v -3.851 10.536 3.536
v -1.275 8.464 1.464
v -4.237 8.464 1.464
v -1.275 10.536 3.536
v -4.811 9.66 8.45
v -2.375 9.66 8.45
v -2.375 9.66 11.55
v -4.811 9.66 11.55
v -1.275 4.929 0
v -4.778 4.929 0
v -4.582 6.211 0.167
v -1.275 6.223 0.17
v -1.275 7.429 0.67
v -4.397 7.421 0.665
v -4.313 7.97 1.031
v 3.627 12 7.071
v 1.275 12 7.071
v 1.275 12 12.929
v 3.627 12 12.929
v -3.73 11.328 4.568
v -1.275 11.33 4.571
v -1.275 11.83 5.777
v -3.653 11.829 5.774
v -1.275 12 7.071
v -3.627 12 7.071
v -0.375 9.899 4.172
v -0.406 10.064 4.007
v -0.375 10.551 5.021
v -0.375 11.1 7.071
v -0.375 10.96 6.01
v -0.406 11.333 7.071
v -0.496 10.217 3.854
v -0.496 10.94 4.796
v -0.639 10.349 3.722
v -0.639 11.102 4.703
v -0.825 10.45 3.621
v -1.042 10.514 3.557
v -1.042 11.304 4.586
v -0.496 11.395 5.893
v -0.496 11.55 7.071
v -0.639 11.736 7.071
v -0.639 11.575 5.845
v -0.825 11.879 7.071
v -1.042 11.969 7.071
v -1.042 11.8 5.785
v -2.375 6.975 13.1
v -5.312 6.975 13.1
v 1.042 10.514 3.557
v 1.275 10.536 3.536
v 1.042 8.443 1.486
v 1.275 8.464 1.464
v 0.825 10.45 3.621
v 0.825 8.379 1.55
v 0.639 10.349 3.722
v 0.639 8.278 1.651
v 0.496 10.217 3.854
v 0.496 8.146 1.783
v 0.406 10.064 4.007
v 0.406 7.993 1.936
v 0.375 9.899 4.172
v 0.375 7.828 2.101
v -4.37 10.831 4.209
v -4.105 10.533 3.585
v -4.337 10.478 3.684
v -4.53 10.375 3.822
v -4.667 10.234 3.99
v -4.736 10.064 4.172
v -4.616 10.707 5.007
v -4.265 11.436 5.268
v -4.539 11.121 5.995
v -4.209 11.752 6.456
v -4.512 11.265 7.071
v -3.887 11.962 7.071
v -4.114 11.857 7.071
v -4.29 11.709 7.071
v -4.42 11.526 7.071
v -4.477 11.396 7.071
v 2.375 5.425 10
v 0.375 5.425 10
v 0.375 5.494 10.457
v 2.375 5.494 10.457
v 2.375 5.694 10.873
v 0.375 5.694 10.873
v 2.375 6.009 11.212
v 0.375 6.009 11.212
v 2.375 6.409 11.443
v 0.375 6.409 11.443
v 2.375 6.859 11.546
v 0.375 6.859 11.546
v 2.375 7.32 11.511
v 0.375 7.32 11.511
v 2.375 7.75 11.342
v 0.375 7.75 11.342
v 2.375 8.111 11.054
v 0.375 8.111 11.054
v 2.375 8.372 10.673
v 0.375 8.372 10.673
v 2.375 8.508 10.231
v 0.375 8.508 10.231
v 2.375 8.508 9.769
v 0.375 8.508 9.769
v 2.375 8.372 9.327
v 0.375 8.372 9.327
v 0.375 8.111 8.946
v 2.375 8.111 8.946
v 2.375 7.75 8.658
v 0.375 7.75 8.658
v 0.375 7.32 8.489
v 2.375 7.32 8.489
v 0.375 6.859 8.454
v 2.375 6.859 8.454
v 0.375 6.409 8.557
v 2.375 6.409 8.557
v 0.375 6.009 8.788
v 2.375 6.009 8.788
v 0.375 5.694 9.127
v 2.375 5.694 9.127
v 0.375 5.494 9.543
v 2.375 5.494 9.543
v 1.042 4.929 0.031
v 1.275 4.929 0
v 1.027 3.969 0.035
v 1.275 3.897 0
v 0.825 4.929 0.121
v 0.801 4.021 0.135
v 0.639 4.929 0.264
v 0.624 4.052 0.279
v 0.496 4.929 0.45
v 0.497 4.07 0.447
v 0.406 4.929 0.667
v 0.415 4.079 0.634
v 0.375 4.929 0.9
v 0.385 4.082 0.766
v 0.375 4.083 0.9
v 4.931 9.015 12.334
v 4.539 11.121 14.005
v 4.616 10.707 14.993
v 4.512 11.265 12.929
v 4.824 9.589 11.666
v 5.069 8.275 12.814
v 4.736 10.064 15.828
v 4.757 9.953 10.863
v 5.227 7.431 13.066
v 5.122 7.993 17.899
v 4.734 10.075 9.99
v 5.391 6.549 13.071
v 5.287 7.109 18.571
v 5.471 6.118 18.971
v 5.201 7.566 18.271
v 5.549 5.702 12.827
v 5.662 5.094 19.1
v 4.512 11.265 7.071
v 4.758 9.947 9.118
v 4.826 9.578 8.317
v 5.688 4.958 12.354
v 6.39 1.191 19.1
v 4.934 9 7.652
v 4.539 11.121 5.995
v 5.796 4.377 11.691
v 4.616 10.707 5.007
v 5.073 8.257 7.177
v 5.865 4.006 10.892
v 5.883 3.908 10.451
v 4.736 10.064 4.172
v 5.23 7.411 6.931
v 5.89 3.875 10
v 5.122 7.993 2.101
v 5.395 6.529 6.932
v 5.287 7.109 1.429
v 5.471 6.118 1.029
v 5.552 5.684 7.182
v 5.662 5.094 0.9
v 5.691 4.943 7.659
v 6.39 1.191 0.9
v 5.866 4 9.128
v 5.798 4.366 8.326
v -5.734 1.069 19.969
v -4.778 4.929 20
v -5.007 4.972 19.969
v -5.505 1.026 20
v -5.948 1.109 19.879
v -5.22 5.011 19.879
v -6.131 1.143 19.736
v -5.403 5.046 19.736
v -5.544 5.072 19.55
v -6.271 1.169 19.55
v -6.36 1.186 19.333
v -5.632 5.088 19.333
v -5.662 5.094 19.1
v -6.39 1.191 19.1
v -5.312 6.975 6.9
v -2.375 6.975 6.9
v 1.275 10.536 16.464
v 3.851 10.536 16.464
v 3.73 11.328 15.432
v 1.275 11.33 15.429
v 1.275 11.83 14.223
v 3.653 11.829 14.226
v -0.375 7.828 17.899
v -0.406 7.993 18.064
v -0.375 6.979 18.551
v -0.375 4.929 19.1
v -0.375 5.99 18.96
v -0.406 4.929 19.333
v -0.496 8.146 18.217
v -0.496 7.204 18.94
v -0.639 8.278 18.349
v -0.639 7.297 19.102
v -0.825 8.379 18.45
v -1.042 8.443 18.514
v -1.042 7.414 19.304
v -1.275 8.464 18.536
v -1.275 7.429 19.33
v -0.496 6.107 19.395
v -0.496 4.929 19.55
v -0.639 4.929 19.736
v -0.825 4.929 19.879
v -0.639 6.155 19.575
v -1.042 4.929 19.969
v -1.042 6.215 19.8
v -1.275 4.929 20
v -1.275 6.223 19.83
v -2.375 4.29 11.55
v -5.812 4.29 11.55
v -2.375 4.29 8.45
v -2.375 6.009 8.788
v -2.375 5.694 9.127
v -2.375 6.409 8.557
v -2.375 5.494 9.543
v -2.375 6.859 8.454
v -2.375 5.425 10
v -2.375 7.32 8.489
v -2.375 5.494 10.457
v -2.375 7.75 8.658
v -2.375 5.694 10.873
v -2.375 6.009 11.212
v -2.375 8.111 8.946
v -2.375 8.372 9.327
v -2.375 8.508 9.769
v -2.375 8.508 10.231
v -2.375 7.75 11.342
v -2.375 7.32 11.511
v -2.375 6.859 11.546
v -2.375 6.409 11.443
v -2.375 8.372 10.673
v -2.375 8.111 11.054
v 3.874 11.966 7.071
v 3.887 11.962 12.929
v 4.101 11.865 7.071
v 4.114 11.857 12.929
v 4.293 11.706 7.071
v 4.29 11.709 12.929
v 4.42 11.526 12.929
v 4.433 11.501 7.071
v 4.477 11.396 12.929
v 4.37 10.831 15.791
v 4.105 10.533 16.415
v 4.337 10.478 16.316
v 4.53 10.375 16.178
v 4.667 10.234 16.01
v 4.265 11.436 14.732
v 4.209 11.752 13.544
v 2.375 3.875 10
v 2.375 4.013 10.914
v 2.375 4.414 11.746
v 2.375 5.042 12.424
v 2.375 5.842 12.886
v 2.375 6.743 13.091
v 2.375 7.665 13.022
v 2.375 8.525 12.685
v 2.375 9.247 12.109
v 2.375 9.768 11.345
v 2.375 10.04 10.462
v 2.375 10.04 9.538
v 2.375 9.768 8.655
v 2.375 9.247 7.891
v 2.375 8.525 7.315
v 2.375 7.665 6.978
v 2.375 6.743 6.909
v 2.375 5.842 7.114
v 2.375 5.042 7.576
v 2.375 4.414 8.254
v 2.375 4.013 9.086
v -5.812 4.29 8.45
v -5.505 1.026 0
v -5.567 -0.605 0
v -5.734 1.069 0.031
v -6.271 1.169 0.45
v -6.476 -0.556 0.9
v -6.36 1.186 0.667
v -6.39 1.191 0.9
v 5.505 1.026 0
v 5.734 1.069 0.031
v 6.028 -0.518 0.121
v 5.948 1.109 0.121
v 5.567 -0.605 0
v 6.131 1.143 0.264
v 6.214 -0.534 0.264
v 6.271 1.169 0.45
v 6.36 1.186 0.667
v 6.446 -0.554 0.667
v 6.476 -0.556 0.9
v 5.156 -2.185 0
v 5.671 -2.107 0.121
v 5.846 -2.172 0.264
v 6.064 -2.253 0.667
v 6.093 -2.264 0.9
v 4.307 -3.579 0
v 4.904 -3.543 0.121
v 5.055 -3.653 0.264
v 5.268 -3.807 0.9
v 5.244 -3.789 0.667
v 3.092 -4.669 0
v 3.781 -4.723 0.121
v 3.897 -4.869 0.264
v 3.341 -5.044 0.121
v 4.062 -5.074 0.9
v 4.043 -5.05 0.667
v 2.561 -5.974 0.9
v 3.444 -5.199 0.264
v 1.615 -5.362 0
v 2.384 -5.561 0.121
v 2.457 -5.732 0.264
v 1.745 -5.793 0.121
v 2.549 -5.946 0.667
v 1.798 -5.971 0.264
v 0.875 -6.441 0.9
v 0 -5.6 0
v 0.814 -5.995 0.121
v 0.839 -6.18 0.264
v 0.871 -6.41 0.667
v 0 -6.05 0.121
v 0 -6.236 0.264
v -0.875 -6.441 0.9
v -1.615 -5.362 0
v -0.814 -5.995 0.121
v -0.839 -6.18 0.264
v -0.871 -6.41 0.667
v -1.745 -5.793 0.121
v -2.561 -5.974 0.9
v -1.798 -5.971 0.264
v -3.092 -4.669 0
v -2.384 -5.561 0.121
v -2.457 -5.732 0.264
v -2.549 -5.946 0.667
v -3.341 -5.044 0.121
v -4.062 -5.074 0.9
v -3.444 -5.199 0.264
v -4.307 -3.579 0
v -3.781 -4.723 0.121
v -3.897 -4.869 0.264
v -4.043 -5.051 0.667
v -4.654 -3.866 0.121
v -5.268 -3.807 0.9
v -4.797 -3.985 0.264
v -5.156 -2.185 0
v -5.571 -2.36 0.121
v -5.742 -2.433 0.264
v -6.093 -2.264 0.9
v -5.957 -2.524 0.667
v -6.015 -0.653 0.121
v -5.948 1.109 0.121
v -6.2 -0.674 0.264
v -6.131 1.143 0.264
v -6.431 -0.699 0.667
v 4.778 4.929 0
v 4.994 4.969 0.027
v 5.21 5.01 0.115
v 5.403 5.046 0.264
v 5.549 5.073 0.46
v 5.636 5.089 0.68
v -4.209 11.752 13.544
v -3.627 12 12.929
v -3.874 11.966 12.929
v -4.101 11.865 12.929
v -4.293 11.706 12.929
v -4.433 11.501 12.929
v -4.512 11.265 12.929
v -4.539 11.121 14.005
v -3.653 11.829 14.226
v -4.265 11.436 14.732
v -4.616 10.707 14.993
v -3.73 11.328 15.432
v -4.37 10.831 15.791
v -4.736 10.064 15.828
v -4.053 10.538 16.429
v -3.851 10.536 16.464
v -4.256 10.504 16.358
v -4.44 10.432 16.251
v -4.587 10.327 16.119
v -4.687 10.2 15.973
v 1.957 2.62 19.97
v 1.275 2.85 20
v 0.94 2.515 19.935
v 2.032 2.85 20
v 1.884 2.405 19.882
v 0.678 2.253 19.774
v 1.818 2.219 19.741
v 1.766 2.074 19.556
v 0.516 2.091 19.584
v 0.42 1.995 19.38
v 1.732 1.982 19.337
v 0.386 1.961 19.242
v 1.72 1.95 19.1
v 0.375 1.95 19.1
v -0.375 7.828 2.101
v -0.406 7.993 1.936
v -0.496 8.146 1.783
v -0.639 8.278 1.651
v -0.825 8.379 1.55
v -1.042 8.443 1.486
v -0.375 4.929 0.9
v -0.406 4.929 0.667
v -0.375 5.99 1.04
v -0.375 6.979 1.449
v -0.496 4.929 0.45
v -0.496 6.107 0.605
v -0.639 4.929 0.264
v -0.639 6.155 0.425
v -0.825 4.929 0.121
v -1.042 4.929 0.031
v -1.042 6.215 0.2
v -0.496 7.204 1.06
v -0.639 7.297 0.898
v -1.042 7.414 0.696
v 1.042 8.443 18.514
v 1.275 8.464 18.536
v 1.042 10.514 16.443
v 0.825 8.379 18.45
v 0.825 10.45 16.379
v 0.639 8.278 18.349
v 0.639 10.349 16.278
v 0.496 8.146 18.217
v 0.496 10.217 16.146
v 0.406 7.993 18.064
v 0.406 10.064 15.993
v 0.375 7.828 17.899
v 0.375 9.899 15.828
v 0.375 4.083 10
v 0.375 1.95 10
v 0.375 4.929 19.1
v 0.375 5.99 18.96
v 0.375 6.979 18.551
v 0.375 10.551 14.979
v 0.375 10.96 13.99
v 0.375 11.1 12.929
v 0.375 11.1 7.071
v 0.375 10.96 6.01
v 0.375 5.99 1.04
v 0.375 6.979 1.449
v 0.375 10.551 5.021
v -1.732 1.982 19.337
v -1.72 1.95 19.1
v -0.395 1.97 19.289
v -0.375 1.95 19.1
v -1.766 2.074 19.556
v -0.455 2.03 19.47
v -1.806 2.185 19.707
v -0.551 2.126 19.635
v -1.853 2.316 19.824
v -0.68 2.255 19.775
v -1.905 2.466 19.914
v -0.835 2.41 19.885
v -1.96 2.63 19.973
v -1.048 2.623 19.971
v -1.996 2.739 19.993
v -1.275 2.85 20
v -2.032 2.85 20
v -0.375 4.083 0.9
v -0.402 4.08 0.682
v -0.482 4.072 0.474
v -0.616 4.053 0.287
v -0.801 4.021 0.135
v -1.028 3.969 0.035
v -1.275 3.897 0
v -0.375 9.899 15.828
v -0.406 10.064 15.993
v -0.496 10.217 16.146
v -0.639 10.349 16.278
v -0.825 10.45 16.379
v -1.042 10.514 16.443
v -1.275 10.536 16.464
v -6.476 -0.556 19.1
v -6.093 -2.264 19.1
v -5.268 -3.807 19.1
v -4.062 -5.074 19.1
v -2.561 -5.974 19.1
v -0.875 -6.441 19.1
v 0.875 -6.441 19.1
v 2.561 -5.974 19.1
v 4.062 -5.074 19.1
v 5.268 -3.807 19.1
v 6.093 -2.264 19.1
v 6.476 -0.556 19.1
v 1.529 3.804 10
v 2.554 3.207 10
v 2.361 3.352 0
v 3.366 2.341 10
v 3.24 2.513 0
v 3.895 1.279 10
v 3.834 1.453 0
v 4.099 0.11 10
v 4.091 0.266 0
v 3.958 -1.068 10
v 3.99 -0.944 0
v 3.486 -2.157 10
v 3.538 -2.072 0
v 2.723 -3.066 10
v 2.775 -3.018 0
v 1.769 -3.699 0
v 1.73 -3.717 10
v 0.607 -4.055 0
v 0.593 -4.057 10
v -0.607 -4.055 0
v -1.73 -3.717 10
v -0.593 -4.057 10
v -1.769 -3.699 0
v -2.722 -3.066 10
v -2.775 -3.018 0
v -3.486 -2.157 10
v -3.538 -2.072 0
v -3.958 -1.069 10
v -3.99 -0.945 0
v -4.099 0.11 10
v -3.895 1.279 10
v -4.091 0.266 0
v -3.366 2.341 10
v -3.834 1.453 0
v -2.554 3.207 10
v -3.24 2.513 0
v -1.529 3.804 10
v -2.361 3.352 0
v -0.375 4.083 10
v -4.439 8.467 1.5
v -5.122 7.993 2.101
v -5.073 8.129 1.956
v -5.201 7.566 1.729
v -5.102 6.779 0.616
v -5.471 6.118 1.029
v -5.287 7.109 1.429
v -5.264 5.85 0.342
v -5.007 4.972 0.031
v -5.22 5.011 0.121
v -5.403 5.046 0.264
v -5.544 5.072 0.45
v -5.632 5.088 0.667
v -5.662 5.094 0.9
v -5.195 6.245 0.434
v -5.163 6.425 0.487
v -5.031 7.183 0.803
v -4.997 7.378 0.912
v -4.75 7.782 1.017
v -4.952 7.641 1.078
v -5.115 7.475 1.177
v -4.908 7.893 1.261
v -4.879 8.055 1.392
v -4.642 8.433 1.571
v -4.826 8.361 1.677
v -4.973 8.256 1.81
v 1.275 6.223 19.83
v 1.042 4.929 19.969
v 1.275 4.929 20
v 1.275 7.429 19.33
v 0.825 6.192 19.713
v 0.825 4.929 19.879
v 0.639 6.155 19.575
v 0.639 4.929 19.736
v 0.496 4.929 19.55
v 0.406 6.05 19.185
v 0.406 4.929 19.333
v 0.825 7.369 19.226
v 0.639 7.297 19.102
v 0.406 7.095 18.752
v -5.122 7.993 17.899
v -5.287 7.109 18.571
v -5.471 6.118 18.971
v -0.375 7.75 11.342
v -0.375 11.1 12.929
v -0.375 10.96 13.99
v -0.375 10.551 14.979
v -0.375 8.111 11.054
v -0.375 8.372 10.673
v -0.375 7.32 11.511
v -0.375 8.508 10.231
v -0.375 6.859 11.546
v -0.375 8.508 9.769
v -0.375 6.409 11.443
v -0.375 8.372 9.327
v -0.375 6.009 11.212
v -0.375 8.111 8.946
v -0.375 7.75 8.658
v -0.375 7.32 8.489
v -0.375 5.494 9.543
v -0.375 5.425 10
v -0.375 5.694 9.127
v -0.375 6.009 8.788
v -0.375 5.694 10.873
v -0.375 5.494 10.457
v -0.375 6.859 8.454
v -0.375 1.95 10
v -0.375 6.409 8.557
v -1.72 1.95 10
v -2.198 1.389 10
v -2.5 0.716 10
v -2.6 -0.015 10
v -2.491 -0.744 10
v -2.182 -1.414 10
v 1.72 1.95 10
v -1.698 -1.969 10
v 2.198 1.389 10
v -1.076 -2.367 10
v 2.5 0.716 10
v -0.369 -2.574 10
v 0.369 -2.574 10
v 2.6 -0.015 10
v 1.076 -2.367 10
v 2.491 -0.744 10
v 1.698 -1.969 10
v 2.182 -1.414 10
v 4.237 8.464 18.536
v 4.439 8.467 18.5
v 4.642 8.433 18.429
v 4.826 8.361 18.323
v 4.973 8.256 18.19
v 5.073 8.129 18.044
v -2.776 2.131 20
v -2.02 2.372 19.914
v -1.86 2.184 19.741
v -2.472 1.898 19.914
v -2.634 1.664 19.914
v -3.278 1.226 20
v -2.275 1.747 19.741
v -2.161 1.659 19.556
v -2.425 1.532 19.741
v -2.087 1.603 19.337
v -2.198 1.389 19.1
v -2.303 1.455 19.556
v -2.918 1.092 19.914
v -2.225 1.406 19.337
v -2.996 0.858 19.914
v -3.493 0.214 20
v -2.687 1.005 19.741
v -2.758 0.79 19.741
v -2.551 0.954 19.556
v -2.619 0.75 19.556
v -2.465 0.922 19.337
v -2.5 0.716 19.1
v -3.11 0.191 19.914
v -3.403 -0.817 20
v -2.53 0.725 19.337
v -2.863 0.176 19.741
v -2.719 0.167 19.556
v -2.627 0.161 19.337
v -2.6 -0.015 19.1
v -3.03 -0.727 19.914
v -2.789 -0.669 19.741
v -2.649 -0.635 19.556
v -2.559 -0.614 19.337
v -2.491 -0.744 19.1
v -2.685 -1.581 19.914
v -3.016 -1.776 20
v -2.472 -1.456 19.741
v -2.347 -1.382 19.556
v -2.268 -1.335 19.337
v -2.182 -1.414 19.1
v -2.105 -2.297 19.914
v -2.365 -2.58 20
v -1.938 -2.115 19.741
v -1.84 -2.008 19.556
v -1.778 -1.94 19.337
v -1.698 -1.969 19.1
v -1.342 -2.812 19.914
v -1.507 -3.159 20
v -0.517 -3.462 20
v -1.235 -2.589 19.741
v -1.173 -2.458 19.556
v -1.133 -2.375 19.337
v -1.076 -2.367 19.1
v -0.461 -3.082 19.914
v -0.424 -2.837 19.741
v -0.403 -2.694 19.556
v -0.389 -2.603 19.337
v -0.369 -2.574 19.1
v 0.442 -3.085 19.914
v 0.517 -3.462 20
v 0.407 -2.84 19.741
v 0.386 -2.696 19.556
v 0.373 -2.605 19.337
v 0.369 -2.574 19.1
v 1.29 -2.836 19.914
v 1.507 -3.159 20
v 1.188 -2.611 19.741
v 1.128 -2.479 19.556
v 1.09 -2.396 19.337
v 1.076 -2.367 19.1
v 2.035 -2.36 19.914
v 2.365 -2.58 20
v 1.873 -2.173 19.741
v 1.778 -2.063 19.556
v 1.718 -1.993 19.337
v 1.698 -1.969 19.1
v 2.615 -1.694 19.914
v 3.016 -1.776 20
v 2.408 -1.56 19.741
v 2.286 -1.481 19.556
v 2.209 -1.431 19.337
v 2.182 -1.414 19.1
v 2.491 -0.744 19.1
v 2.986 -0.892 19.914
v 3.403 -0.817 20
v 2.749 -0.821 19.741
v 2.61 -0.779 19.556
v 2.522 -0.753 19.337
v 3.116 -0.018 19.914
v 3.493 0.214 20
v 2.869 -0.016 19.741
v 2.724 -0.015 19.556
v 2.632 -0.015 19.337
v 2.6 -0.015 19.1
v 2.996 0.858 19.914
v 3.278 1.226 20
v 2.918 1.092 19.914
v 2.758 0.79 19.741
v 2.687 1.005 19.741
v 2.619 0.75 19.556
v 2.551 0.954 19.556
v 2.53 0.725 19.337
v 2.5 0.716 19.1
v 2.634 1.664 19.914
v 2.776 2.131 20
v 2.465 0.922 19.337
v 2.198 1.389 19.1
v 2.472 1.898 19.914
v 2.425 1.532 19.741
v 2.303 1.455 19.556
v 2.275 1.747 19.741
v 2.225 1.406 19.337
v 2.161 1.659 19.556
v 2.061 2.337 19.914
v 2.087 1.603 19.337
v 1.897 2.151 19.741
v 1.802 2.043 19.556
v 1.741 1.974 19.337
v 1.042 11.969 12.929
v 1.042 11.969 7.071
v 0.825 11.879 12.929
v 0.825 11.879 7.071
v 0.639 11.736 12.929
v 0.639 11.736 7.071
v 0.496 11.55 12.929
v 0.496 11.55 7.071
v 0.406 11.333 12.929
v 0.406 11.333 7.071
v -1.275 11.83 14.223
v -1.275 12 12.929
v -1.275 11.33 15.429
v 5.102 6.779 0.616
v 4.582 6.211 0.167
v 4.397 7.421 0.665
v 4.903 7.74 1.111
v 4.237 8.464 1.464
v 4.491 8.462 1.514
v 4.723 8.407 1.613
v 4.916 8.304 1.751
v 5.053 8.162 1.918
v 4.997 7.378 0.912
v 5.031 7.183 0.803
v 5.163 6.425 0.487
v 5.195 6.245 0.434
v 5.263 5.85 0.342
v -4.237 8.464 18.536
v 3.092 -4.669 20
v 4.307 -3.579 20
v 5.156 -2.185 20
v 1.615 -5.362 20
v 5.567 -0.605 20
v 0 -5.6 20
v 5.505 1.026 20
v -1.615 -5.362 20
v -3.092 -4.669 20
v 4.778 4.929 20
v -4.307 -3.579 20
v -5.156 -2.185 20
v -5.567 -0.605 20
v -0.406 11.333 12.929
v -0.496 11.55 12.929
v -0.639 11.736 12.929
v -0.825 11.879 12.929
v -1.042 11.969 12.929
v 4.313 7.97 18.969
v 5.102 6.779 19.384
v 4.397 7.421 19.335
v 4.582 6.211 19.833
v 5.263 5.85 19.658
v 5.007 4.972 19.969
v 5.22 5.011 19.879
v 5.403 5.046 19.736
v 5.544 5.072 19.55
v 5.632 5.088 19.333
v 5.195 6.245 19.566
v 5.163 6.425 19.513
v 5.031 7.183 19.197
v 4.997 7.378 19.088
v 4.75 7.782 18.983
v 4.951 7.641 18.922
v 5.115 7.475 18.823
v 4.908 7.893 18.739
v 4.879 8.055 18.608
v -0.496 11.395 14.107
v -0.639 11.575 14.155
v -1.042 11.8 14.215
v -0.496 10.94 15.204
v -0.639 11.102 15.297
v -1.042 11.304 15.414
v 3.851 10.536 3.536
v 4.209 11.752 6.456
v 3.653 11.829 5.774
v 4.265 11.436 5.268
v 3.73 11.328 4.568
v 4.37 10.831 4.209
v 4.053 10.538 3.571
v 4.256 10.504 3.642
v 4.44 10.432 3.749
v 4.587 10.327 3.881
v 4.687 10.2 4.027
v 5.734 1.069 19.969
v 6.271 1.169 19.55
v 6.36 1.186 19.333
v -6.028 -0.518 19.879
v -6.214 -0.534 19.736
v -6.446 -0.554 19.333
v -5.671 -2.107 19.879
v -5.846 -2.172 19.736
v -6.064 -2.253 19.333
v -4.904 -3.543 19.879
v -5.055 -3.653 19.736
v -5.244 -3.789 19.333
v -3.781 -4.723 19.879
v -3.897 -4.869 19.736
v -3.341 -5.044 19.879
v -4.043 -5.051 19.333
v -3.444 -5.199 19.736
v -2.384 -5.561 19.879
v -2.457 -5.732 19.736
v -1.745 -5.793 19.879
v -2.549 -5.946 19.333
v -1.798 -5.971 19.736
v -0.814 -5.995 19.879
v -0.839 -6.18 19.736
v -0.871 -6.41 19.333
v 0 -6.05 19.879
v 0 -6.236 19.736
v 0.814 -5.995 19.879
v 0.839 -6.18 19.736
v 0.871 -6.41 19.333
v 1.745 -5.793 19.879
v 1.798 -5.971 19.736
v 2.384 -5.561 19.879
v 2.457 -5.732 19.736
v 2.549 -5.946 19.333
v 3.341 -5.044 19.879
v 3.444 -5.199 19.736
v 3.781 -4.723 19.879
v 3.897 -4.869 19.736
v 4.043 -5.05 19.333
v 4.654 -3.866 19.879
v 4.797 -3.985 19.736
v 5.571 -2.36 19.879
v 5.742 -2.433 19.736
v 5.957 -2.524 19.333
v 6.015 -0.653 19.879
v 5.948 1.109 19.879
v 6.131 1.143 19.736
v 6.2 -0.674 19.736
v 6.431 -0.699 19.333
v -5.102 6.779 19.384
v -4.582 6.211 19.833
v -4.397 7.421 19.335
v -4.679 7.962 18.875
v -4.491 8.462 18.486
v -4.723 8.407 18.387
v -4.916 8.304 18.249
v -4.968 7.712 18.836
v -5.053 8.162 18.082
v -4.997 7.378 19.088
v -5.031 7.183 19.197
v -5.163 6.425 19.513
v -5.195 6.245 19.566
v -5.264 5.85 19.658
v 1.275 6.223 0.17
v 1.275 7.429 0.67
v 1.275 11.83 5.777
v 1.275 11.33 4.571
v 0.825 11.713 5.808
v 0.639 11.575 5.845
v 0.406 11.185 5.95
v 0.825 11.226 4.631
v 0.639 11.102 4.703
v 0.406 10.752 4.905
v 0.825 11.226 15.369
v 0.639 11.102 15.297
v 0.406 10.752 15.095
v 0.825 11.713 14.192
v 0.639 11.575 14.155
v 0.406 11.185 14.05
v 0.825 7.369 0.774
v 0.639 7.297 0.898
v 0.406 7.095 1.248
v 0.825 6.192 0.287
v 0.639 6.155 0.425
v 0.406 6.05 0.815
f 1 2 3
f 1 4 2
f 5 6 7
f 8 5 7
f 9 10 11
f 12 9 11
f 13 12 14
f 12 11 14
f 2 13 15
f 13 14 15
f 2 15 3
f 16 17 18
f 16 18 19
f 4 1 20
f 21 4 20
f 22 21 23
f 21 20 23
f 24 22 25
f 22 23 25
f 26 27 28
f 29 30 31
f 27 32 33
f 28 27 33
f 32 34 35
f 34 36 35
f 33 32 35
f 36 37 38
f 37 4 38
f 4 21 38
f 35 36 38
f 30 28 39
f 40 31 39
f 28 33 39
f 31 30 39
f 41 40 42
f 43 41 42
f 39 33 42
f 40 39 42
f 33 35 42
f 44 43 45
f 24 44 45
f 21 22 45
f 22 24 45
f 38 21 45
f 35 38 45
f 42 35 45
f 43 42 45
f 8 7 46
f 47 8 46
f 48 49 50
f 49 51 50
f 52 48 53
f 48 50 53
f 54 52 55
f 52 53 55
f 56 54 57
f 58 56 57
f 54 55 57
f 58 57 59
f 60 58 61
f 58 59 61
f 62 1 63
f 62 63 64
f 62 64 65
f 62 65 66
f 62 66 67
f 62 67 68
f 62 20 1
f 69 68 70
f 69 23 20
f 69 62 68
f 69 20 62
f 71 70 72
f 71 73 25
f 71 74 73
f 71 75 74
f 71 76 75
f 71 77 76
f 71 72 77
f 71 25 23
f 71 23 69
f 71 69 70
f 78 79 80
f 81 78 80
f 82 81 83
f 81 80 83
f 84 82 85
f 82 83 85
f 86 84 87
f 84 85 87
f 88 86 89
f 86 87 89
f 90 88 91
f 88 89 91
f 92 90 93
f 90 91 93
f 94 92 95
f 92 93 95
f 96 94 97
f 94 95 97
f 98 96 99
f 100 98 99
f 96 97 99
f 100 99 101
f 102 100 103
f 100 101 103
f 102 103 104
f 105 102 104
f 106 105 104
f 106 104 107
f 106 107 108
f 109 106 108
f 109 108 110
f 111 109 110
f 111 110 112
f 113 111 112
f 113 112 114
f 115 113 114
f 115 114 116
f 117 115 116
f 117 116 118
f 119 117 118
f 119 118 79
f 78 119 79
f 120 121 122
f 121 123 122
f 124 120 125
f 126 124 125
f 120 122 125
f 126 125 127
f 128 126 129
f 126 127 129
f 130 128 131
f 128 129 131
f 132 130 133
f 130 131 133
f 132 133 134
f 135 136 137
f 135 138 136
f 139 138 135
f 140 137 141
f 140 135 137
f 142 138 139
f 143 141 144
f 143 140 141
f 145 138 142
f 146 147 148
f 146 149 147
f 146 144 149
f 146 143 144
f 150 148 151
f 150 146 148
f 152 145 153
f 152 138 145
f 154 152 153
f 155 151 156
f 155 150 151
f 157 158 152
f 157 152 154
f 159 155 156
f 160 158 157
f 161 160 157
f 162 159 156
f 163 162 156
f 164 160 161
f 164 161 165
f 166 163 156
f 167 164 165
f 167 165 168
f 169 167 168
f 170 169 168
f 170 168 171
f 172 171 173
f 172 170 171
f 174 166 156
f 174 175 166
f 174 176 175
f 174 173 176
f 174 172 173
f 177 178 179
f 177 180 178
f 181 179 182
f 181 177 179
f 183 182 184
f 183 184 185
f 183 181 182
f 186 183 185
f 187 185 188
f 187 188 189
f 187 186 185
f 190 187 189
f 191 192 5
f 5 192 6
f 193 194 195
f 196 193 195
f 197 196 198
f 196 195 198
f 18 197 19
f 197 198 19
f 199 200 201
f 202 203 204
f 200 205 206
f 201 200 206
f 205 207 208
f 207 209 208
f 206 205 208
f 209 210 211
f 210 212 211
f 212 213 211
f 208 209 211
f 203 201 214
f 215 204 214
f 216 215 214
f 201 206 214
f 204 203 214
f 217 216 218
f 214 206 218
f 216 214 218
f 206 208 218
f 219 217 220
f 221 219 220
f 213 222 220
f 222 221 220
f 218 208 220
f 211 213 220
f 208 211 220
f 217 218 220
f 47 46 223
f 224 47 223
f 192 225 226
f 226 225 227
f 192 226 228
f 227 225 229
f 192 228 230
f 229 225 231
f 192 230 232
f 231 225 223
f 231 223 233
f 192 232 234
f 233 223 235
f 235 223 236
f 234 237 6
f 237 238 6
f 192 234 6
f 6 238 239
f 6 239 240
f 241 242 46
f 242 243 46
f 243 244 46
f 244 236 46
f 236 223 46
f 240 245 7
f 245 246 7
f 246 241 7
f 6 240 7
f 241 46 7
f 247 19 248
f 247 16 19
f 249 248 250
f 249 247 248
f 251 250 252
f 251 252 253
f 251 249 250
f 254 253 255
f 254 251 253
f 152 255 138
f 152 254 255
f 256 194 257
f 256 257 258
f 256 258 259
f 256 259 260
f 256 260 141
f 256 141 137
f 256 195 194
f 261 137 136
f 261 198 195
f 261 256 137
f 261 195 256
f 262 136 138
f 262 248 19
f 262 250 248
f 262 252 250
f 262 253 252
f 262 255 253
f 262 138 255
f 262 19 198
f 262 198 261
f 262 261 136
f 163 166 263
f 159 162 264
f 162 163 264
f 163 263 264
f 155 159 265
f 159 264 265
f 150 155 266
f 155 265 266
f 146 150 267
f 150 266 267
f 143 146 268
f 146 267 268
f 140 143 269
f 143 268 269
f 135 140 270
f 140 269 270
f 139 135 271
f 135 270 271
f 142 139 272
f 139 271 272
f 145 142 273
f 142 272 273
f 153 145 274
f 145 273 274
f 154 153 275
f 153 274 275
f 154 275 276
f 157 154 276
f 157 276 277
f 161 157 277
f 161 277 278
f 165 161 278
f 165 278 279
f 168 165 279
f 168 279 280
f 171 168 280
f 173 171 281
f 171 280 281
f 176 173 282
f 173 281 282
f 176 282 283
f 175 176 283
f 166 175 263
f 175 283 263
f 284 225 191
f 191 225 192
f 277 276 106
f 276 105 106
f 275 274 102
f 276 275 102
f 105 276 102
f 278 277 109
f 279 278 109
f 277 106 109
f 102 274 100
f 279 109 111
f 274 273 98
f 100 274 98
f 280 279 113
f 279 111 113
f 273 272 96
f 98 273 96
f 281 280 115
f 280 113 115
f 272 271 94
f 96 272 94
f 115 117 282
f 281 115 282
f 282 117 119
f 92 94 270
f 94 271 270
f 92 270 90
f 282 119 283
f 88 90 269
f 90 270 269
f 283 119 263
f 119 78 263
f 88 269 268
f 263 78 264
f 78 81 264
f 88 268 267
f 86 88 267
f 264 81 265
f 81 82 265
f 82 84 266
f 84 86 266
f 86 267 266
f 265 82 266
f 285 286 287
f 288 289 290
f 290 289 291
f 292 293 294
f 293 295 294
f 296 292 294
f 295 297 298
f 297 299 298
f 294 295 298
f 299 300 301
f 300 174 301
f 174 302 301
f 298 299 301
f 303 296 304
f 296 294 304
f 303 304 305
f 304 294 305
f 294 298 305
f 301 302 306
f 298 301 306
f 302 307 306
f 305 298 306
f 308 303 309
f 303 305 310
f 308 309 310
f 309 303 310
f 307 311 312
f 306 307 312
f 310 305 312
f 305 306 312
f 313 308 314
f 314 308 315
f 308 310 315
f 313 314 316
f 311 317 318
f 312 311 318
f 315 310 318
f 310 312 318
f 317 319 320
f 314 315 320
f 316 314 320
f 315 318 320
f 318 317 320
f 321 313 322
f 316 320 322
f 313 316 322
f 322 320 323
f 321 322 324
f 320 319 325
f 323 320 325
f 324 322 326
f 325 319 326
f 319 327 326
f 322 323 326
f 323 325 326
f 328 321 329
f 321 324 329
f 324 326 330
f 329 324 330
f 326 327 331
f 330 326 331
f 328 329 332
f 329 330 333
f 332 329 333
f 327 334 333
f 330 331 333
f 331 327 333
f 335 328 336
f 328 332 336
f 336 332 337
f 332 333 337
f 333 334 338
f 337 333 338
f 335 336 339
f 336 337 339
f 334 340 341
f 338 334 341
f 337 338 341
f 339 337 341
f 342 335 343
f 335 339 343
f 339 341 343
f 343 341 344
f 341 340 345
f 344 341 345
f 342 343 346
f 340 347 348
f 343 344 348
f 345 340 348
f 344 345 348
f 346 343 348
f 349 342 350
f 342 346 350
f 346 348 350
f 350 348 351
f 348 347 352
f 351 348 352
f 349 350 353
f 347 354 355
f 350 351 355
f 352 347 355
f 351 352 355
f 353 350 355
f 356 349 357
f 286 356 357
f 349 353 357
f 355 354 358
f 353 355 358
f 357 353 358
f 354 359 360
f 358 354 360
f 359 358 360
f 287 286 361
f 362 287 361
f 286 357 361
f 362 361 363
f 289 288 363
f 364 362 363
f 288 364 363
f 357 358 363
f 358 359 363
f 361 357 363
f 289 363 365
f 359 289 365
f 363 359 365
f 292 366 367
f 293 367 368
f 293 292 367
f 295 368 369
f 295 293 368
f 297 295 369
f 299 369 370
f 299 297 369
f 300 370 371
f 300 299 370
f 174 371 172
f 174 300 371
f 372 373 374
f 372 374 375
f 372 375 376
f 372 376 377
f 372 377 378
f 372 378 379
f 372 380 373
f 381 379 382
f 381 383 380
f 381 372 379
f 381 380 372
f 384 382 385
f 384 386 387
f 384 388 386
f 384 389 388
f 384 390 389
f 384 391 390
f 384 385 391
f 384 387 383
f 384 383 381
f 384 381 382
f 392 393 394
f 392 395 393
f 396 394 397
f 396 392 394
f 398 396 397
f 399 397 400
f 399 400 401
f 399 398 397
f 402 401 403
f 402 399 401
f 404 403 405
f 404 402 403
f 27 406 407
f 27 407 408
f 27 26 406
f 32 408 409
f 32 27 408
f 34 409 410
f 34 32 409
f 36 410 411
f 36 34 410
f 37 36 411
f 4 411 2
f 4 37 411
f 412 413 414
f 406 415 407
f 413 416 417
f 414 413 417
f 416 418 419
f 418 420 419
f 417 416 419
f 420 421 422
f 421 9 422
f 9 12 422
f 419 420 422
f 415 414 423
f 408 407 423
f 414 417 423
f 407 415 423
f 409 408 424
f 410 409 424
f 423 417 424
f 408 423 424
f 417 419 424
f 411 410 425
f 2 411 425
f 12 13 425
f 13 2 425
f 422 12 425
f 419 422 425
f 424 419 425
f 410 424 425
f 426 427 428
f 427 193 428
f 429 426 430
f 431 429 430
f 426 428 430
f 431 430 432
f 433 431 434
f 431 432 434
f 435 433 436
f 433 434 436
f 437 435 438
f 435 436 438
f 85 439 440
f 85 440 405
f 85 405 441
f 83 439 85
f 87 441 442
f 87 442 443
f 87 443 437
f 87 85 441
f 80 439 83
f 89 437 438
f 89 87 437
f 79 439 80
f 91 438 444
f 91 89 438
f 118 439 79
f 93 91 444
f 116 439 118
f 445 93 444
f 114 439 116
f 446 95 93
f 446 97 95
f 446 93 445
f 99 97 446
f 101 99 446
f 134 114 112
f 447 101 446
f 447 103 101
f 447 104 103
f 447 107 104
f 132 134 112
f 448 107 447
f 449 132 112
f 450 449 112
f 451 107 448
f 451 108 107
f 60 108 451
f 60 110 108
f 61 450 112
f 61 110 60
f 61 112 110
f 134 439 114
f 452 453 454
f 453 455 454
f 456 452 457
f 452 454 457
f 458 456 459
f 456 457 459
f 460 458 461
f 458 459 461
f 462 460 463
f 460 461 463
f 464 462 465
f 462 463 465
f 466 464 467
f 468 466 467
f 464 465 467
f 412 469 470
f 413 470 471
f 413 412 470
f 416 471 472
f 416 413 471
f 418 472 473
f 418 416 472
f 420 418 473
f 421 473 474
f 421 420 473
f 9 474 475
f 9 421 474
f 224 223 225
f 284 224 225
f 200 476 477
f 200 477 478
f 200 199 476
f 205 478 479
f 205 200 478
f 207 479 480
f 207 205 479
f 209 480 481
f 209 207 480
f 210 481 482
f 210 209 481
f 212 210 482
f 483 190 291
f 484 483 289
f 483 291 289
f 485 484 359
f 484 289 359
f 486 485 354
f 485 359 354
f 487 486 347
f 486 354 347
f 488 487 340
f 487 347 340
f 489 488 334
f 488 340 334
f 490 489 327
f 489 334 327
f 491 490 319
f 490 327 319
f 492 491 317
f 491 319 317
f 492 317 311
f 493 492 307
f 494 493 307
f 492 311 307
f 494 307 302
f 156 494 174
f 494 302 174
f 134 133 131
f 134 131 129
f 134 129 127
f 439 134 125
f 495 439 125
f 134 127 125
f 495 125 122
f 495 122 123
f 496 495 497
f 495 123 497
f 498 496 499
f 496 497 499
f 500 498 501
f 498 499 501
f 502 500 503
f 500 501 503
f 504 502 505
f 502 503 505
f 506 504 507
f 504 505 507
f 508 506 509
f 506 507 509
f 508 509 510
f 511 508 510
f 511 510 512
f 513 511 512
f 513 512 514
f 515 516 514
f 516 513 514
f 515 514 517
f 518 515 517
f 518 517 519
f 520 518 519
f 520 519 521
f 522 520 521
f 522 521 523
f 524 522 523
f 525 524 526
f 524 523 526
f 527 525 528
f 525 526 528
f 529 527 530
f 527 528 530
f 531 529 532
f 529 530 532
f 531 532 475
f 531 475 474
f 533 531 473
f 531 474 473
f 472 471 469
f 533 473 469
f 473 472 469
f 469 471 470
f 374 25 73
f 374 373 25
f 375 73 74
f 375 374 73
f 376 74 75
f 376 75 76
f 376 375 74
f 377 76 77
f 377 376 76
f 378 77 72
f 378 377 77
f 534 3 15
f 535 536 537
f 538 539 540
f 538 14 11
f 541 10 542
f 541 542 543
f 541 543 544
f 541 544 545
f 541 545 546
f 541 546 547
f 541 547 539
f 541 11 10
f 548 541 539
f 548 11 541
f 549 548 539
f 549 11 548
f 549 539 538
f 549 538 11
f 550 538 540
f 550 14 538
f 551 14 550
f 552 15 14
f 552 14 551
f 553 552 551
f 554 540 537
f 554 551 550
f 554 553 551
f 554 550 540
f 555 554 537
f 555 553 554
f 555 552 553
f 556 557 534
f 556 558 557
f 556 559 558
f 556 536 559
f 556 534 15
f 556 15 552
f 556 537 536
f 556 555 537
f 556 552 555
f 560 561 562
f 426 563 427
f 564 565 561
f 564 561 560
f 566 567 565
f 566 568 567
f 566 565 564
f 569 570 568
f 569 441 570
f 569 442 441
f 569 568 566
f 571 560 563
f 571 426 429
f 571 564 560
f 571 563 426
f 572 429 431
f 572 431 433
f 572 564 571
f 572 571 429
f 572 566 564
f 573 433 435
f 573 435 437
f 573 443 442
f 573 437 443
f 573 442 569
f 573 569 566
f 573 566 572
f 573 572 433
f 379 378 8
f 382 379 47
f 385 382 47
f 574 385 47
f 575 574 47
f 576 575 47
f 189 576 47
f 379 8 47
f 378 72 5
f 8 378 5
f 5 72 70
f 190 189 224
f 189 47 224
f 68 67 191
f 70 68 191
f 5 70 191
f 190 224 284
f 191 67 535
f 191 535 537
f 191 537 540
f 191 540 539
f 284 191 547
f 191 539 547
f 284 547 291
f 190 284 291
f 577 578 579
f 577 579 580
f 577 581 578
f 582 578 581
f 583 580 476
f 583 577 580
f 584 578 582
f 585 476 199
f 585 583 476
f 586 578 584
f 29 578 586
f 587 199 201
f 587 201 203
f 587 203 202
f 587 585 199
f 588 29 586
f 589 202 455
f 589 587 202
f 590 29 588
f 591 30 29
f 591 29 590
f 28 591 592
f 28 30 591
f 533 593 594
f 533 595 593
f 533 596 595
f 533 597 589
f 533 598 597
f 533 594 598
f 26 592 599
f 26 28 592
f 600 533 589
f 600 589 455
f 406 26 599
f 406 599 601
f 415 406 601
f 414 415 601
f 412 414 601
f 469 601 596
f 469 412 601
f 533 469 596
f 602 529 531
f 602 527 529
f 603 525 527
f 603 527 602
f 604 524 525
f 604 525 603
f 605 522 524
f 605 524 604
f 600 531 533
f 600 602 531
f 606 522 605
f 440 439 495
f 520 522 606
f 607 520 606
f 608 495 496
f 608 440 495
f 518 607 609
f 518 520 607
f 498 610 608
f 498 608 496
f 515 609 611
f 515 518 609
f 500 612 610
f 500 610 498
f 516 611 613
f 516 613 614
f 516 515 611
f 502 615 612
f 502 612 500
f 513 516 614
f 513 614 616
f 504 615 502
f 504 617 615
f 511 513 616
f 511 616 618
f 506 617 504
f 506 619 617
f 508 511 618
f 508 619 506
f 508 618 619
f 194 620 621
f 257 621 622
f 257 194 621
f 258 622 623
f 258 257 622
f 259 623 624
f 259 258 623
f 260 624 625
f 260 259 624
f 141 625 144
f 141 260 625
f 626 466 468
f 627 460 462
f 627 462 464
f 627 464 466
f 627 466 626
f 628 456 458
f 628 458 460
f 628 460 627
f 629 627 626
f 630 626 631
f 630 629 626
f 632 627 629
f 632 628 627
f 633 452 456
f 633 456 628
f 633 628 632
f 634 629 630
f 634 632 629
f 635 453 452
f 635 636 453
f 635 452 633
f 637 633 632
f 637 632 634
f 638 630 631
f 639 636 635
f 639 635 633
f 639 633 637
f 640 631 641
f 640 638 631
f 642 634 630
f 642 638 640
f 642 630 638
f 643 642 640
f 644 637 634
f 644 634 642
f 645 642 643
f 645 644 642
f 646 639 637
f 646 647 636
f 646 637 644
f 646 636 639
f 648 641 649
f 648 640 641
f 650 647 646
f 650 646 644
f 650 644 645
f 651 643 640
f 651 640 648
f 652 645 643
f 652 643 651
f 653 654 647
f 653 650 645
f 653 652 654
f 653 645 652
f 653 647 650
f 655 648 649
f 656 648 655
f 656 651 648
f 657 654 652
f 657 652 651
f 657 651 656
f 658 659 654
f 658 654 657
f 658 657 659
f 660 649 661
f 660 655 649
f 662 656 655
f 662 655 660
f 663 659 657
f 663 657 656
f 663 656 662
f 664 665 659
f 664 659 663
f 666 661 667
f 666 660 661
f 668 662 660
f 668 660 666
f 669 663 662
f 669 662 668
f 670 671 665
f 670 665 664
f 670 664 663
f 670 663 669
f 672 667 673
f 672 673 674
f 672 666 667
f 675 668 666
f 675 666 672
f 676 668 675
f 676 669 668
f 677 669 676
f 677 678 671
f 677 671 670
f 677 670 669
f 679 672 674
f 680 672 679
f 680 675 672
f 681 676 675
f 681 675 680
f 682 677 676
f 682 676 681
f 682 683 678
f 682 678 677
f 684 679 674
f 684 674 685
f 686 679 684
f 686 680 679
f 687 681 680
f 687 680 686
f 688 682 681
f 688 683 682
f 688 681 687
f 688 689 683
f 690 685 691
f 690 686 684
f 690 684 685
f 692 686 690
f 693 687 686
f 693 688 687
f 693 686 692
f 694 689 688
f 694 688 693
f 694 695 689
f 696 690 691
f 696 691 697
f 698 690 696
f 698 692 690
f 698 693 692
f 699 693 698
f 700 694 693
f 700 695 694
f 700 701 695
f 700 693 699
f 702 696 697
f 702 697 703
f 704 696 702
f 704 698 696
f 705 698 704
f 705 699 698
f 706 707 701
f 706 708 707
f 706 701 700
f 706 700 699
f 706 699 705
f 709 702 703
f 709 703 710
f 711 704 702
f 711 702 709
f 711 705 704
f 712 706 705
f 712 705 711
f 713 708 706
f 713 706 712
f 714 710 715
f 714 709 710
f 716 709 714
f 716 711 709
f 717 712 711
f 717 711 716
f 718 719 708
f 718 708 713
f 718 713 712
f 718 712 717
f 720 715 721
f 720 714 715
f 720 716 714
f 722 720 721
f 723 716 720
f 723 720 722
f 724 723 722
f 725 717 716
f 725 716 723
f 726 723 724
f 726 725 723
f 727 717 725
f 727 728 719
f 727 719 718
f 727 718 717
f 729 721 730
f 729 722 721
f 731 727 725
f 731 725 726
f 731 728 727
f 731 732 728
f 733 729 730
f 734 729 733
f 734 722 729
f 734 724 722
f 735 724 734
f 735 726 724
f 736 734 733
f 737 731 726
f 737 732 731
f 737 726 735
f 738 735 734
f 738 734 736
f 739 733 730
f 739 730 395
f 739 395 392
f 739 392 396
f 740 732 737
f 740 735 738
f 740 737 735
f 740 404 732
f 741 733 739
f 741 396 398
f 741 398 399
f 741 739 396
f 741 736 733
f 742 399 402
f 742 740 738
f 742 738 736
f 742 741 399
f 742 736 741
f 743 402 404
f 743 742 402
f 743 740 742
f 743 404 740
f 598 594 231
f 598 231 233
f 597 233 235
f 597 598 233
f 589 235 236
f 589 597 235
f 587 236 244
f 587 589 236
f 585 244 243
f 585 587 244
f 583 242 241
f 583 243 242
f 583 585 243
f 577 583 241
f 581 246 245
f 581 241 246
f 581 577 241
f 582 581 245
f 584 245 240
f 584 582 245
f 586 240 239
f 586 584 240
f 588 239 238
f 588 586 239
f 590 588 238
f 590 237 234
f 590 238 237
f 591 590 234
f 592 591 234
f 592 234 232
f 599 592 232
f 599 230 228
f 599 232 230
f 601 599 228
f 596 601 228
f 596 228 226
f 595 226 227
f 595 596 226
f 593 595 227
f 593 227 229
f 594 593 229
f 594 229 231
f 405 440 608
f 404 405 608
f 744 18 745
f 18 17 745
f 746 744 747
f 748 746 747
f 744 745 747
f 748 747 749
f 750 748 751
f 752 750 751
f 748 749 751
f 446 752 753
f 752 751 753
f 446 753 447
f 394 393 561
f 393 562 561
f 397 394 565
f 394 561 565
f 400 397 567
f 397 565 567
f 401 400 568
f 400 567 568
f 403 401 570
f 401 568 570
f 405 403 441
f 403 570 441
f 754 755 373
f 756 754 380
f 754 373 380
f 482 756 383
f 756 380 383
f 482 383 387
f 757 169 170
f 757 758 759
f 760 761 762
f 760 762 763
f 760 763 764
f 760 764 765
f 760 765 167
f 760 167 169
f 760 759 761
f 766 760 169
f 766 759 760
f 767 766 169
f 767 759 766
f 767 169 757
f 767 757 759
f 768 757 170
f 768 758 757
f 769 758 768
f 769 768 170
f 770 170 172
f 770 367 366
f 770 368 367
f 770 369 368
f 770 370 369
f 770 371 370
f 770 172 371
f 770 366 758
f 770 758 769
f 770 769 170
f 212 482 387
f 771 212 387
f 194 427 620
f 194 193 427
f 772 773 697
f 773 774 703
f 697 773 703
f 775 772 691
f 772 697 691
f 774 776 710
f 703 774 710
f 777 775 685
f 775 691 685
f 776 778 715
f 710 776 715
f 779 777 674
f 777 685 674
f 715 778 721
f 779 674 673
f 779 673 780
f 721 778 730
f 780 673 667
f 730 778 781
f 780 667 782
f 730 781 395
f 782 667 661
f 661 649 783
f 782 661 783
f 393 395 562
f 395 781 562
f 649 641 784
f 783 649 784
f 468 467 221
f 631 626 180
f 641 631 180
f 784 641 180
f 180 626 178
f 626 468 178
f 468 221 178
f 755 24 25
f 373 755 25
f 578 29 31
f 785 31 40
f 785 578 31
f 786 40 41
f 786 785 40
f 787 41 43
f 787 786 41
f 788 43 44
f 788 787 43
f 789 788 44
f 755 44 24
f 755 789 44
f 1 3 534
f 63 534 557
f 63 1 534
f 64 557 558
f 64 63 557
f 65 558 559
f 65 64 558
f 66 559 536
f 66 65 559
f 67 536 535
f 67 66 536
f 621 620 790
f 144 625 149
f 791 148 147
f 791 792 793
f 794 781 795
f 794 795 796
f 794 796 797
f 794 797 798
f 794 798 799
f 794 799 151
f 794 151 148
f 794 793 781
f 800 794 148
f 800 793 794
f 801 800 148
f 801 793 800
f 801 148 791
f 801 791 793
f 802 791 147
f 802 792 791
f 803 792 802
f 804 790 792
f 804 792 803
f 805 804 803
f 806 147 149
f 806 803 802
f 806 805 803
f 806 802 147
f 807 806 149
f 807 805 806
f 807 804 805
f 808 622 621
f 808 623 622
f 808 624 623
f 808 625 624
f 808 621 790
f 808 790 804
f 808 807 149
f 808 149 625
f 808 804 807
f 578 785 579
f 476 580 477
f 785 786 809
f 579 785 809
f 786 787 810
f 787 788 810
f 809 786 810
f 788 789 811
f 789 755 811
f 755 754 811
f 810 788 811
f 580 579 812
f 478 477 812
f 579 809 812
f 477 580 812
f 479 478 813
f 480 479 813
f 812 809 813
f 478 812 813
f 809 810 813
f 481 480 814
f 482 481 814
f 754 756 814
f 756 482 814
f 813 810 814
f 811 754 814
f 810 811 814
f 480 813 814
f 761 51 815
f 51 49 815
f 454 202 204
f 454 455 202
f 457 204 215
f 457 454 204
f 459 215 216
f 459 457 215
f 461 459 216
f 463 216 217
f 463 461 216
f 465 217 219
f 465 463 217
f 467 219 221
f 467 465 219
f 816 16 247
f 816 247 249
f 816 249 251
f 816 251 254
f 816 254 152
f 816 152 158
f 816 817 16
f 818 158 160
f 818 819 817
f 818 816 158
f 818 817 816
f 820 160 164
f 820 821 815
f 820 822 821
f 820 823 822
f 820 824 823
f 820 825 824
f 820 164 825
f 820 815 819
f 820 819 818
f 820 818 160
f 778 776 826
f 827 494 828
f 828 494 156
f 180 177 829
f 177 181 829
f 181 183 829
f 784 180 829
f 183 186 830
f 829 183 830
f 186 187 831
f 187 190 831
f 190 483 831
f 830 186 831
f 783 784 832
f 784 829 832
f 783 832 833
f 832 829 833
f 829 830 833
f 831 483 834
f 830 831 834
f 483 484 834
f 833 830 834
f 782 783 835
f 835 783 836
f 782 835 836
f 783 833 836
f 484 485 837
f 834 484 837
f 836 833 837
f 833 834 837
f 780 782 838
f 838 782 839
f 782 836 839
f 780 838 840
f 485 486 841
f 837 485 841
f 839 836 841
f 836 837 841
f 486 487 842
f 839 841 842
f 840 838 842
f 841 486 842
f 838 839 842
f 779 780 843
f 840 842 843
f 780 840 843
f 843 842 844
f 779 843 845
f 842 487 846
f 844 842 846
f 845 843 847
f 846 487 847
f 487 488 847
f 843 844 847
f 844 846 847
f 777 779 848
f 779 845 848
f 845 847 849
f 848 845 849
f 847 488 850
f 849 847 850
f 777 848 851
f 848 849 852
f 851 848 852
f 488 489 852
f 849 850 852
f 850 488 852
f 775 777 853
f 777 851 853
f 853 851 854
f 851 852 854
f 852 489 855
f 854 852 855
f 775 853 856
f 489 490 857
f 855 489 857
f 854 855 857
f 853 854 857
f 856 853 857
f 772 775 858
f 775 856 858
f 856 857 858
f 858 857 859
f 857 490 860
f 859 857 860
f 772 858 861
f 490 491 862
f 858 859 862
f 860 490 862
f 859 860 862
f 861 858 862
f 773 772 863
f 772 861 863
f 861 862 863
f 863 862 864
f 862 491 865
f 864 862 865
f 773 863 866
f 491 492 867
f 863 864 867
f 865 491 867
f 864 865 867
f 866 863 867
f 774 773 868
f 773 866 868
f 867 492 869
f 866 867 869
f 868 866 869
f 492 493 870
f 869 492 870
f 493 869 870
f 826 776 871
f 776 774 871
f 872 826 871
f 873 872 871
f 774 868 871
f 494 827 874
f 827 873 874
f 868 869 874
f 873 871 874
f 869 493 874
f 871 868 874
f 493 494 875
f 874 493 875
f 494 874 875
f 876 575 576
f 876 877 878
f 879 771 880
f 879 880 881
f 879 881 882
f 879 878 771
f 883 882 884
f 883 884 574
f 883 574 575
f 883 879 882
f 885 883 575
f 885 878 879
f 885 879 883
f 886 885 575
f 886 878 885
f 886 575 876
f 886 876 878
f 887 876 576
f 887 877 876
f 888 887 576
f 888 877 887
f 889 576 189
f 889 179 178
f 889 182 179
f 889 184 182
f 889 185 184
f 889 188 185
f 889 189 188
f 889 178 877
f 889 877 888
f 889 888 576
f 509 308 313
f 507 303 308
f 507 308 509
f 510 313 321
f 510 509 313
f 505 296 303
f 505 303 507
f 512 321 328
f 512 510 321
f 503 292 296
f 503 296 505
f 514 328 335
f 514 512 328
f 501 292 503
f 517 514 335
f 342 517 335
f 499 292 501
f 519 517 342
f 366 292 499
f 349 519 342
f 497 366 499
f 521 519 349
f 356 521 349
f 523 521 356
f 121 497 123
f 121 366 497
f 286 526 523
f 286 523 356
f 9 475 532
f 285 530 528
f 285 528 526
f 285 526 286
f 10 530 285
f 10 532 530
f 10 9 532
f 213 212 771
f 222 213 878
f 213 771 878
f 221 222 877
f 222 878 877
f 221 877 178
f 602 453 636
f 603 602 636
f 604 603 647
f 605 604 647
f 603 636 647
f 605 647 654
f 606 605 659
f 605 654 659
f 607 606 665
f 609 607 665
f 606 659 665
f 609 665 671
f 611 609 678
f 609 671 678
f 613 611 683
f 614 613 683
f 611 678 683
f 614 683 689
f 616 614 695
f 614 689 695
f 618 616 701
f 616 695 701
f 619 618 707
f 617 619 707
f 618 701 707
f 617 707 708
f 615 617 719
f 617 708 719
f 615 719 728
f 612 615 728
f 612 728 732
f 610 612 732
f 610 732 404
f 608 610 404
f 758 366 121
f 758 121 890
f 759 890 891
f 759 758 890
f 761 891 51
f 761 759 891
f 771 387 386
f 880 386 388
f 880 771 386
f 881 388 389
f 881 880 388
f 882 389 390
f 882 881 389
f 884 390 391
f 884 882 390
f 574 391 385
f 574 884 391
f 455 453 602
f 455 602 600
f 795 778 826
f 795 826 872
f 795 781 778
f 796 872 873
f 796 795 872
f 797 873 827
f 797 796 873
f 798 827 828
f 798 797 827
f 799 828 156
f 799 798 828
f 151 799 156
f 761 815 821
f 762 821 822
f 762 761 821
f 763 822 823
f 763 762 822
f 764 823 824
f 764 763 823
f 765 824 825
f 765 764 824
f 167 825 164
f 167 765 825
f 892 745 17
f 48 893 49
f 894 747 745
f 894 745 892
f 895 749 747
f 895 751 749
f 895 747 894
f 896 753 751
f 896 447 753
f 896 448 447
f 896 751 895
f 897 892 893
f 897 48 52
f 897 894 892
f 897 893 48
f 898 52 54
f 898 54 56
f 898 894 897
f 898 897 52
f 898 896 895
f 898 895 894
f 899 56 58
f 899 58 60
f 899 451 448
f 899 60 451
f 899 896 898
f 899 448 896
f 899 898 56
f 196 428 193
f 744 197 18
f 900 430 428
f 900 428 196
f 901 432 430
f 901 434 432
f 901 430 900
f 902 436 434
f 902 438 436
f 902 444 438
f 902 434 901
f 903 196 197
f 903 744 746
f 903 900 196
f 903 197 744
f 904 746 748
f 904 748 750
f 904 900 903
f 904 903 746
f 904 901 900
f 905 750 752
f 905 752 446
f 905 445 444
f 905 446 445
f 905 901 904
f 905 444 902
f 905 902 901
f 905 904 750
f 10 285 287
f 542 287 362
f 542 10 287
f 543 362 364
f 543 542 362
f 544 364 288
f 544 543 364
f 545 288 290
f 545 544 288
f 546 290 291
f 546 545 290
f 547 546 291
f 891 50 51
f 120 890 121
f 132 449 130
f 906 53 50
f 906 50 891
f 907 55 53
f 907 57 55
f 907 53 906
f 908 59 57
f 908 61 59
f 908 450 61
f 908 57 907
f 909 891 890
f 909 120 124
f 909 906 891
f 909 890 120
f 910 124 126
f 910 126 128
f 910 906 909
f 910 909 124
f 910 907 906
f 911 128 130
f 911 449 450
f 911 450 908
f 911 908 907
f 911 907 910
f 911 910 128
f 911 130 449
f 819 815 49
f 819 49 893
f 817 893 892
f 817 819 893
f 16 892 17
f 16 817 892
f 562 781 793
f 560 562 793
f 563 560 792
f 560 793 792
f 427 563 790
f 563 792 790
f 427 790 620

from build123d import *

# Parameters (mm, degrees)
EXTRUDE002_DEPTH     = 10
SKETCH004_R          = 3.1
EXTRUDE001_DEPTH     = 10
EXTRUDE_DEPTH        = 20
SKETCH001_R          = 4.1
POCKET_DEPTH         = 10
POCKET001_DEPTH      = 10
SKETCH003_R          = 1.55
POCKET002_DEPTH      = 6.126038
POCKET002_DEPTH_BACK = -6.875962
CHAMFER_SIZE         = 5
FILLET_R             = 5
FILLET001_R          = 0.9


with BuildPart() as extrude002:
    # Sketch005 → Extrude002 (new body)
    with BuildSketch(Plane.YZ.offset(-0.375038)):
        Polygon((9.659679, 11.55), (6.975, 13.1), (4.290321, 11.55), (4.290321, 8.45), (6.975, 6.9), (9.659679, 8.45), align=None)
    extrude(amount=-EXTRUDE002_DEPTH)


with BuildPart() as extrude002_1:
    # Extrude002 placement: moved
    add(extrude002.part.moved(Location((-2, 0, 0))))


with BuildPart() as extrude001:
    # Sketch004 → Extrude001 (new body)
    with BuildSketch(Plane(origin=(0.374962, 0, 0), x_dir=(0, -1, 0), z_dir=(-1, 0, 0))):
        with Locations((-6.975, 10)):
            Circle(SKETCH004_R)
    extrude(amount=-EXTRUDE001_DEPTH)


with BuildPart() as extrude001_1:
    # Extrude001 placement: moved
    add(extrude001.part.moved(Location((2, 0, 0))))


with BuildPart() as fillet001:
    # Sketch → Extrude (new body)
    with BuildSketch(Plane.XY):
        with BuildLine():
            Line((-0.375038, 12), (-0.375038, 0))
            Line((-0.375038, 0), (0.374962, 0))
            Line((0.374962, 0), (0.374962, 12))
            Line((0.374962, 12), (4.374962, 12))
            Line((4.374962, 12), (6.389918, 1.191196))
            ThreePointArc((-6.389921, 1.191182), (7e-06, -6.5), (6.389918, 1.191196))
            Line((-4.375038, 12), (-6.389921, 1.191182))
            Line((-0.375038, 12), (-4.375038, 12))
        make_face()
    extrude(amount=EXTRUDE_DEPTH)

    # Sketch001 → Pocket (cut)
    with BuildSketch(Plane(origin=(0, 0, 0), x_dir=(1, 0, 0), z_dir=(0, 0, -1))):
        Circle(SKETCH001_R)
    extrude(amount=-POCKET_DEPTH, mode=Mode.SUBTRACT)

    # Sketch002 → Pocket001 (cut)
    with BuildSketch(Plane.XY.offset(20)):
        with BuildLine():
            ThreePointArc((-1.719738, 1.95), (0, -2.6), (1.719738, 1.95))
            Line((-1.719738, 1.95), (1.719738, 1.95))
        make_face()
    extrude(amount=-POCKET001_DEPTH, mode=Mode.SUBTRACT)

    # Sketch003 → Pocket002 (cut, two sides)
    with BuildSketch(Plane(origin=(0.374962, 0, 0), x_dir=(0, -1, 0), z_dir=(-1, 0, 0))) as pocket002_sk:
        with Locations((-6.975, 10)):
            Circle(SKETCH003_R)
    extrude(amount=-POCKET002_DEPTH, mode=Mode.SUBTRACT)
    extrude(pocket002_sk.sketch, amount=-POCKET002_DEPTH_BACK, mode=Mode.SUBTRACT)

    # Cut: cut Extrude001
    add(extrude001_1.part, mode=Mode.SUBTRACT)

    # Cut001: cut Extrude002
    add(extrude002_1.part, mode=Mode.SUBTRACT)

    # Chamfer
    chamfer_edges = [fillet001.edges().sort_by_distance(p)[0] for p in [
        (-2.375038, 12, 0),
        (2.374962, 12, 0),
        (-2.375038, 12, 20),
        (2.374962, 12, 20),
    ]]
    chamfer(chamfer_edges, length=CHAMFER_SIZE)

    # Fillet
    fillet_edges = [fillet001.edges().sort_by_distance(p)[0] for p in [
        (-2.841066, 7, 0),
        (2.841007, 7, 0),
        (-2.375038, 12, 5),
        (-2.375038, 12, 15),
        (-2.841066, 7, 20),
        (2.841007, 7, 20),
        (2.374962, 12, 5),
        (2.374962, 12, 15),
    ]]
    fillet(fillet_edges, radius=FILLET_R)

    # Fillet001
    fillet001_edges = [fillet001.edges().sort_by_distance(p)[0] for p in [
        (-0.375038, 3.439466, 20),
        (-1.047388, 1.95, 20),
        (-6.041542, 3.060057, 20),
        (7e-06, -6.5, 20),
        (6.041527, 3.060064, 20),
        (0, -2.6, 20),
        (0.374962, 3.439466, 20),
        (1.04735, 1.95, 20),
    ]]
    fillet(fillet001_edges, radius=FILLET001_R)


solid = fillet001.part
